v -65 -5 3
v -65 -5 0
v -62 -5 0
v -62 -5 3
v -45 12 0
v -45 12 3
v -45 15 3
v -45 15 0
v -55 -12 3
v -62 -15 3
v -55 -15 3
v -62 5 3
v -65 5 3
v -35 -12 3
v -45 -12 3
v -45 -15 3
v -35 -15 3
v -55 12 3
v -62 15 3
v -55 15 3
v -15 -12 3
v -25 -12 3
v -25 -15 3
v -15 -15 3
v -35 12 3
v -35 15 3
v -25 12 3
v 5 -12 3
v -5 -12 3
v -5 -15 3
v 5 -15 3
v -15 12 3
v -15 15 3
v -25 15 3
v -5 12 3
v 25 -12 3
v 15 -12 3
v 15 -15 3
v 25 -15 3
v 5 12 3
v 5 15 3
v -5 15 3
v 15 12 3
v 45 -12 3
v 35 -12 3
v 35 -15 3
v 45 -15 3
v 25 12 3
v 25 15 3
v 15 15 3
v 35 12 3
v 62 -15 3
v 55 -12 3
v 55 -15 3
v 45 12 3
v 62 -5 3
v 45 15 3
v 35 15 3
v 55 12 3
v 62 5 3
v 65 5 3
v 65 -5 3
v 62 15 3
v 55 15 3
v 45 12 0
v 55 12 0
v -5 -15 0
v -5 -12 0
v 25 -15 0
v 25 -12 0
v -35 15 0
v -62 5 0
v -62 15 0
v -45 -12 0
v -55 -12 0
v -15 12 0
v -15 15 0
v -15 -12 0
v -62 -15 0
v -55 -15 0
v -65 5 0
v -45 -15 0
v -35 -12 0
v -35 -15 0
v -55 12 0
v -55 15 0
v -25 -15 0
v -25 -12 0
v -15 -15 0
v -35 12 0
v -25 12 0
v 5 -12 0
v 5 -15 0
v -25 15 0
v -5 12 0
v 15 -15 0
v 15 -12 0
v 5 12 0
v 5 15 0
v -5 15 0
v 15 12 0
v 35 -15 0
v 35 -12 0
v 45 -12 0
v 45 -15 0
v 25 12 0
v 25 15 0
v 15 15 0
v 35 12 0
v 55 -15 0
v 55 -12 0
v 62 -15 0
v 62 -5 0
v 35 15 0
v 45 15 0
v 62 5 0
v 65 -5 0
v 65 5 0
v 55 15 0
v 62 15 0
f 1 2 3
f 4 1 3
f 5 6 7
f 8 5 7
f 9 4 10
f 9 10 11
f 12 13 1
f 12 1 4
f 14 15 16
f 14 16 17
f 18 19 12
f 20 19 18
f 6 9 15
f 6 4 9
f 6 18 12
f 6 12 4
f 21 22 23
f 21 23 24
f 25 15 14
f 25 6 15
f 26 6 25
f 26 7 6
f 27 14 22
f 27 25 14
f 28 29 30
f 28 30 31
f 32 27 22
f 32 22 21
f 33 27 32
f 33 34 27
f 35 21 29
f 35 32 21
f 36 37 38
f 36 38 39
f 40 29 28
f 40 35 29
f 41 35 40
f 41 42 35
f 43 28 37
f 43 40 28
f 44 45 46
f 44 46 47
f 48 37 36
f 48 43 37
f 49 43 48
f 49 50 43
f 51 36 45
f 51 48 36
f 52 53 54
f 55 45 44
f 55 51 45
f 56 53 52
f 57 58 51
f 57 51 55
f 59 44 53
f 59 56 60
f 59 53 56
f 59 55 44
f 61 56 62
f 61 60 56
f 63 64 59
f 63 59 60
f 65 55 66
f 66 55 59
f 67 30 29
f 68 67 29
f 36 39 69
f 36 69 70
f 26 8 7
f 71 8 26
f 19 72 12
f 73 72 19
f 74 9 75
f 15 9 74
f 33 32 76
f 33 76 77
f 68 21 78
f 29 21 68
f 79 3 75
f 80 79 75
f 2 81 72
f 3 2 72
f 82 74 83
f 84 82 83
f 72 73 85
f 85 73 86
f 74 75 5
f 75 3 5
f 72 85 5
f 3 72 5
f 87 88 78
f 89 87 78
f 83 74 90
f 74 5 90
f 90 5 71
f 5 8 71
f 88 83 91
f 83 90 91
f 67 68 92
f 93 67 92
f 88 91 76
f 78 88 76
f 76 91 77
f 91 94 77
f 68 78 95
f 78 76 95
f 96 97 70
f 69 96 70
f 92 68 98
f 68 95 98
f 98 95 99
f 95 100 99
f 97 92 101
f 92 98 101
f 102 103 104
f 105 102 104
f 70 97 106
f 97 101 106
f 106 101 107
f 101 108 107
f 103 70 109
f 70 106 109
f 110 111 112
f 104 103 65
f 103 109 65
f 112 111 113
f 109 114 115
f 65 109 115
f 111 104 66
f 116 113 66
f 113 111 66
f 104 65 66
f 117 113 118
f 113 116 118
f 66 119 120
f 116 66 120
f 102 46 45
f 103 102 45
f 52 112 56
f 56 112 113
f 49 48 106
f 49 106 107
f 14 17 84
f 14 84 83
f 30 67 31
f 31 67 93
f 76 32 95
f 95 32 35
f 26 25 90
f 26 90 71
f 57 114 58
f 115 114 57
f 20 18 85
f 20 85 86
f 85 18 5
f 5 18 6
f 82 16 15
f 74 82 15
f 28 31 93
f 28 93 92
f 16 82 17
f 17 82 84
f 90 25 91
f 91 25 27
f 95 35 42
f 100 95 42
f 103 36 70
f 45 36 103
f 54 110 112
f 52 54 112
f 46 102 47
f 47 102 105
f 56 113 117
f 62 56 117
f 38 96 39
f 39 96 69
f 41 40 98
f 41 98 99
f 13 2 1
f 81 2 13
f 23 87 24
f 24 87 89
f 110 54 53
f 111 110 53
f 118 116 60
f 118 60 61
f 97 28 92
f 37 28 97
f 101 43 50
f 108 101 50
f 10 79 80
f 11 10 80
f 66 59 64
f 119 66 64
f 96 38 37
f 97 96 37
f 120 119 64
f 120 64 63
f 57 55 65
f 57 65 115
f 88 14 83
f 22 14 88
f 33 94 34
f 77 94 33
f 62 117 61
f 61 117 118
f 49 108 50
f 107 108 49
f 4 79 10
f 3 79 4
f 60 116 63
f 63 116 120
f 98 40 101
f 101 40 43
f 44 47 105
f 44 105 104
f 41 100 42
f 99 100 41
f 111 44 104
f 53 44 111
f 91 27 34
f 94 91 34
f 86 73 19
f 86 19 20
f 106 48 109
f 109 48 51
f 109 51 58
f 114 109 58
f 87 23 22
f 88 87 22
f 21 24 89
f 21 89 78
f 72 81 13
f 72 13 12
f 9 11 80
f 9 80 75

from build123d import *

# Parameters (mm, degrees)
F0_W     = 130
F0_H     = 30
F2_DEPTH = 3
F1_W     = 3
F1_H     = 10
F3_DEPTH = 25
F4_W     = 10
F4_H     = 3
F5_DEPTH = 25


with BuildPart() as f2:
    # F0 (on Top) → F2 (new body)
    with BuildSketch(Plane.XY):
        Rectangle(F0_W, F0_H)
    extrude(amount=F2_DEPTH)

    # F1 (on face) → F3 (cut)
    with BuildSketch(Plane.XY):
        with Locations((63.5, -10)):
            Rectangle(F1_W, F1_H)
        with Locations((63.5, 10)):
            Rectangle(F1_W, F1_H)
        with Locations((63.5, 30)):
            Rectangle(F1_W, F1_H)
        with Locations((63.5, 50)):
            Rectangle(F1_W, F1_H)
        with Locations((63.5, 70)):
            Rectangle(F1_W, F1_H)
        with Locations((63.5, 90)):
            Rectangle(F1_W, F1_H)
        with Locations((-63.5, -10)):
            Rectangle(F1_W, F1_H)
        with Locations((-63.5, 70)):
            Rectangle(F1_W, F1_H)
        with Locations((-63.5, 50)):
            Rectangle(F1_W, F1_H)
        with Locations((-63.5, 30)):
            Rectangle(F1_W, F1_H)
        with Locations((-63.5, 90)):
            Rectangle(F1_W, F1_H)
        with Locations((-63.5, 10)):
            Rectangle(F1_W, F1_H)
    extrude(amount=F3_DEPTH, mode=Mode.SUBTRACT)

    # F4 (on face) → F5 (cut)
    with BuildSketch(Plane.XY.offset(3)):
        with Locations((-50, -13.5)):
            Rectangle(F4_W, F4_H)
        with Locations((-30, -13.5)):
            Rectangle(F4_W, F4_H)
        with Locations((-10, -13.5)):
            Rectangle(F4_W, F4_H)
        with Locations((10, -13.5)):
            Rectangle(F4_W, F4_H)
        with Locations((30, -13.5)):
            Rectangle(F4_W, F4_H)
        with Locations((50, -13.5)):
            Rectangle(F4_W, F4_H)
        with Locations((30, 13.5)):
            Rectangle(F4_W, F4_H)
        with Locations((-50, 13.5)):
            Rectangle(F4_W, F4_H)
        with Locations((50, 13.5)):
            Rectangle(F4_W, F4_H)
        with Locations((-30, 13.5)):
            Rectangle(F4_W, F4_H)
        with Locations((70, 13.5)):
            Rectangle(F4_W, F4_H)
        with Locations((-10, 13.5)):
            Rectangle(F4_W, F4_H)
        with Locations((10, 13.5)):
            Rectangle(F4_W, F4_H)
    extrude(amount=-F5_DEPTH, mode=Mode.SUBTRACT)


solid = f2.part
